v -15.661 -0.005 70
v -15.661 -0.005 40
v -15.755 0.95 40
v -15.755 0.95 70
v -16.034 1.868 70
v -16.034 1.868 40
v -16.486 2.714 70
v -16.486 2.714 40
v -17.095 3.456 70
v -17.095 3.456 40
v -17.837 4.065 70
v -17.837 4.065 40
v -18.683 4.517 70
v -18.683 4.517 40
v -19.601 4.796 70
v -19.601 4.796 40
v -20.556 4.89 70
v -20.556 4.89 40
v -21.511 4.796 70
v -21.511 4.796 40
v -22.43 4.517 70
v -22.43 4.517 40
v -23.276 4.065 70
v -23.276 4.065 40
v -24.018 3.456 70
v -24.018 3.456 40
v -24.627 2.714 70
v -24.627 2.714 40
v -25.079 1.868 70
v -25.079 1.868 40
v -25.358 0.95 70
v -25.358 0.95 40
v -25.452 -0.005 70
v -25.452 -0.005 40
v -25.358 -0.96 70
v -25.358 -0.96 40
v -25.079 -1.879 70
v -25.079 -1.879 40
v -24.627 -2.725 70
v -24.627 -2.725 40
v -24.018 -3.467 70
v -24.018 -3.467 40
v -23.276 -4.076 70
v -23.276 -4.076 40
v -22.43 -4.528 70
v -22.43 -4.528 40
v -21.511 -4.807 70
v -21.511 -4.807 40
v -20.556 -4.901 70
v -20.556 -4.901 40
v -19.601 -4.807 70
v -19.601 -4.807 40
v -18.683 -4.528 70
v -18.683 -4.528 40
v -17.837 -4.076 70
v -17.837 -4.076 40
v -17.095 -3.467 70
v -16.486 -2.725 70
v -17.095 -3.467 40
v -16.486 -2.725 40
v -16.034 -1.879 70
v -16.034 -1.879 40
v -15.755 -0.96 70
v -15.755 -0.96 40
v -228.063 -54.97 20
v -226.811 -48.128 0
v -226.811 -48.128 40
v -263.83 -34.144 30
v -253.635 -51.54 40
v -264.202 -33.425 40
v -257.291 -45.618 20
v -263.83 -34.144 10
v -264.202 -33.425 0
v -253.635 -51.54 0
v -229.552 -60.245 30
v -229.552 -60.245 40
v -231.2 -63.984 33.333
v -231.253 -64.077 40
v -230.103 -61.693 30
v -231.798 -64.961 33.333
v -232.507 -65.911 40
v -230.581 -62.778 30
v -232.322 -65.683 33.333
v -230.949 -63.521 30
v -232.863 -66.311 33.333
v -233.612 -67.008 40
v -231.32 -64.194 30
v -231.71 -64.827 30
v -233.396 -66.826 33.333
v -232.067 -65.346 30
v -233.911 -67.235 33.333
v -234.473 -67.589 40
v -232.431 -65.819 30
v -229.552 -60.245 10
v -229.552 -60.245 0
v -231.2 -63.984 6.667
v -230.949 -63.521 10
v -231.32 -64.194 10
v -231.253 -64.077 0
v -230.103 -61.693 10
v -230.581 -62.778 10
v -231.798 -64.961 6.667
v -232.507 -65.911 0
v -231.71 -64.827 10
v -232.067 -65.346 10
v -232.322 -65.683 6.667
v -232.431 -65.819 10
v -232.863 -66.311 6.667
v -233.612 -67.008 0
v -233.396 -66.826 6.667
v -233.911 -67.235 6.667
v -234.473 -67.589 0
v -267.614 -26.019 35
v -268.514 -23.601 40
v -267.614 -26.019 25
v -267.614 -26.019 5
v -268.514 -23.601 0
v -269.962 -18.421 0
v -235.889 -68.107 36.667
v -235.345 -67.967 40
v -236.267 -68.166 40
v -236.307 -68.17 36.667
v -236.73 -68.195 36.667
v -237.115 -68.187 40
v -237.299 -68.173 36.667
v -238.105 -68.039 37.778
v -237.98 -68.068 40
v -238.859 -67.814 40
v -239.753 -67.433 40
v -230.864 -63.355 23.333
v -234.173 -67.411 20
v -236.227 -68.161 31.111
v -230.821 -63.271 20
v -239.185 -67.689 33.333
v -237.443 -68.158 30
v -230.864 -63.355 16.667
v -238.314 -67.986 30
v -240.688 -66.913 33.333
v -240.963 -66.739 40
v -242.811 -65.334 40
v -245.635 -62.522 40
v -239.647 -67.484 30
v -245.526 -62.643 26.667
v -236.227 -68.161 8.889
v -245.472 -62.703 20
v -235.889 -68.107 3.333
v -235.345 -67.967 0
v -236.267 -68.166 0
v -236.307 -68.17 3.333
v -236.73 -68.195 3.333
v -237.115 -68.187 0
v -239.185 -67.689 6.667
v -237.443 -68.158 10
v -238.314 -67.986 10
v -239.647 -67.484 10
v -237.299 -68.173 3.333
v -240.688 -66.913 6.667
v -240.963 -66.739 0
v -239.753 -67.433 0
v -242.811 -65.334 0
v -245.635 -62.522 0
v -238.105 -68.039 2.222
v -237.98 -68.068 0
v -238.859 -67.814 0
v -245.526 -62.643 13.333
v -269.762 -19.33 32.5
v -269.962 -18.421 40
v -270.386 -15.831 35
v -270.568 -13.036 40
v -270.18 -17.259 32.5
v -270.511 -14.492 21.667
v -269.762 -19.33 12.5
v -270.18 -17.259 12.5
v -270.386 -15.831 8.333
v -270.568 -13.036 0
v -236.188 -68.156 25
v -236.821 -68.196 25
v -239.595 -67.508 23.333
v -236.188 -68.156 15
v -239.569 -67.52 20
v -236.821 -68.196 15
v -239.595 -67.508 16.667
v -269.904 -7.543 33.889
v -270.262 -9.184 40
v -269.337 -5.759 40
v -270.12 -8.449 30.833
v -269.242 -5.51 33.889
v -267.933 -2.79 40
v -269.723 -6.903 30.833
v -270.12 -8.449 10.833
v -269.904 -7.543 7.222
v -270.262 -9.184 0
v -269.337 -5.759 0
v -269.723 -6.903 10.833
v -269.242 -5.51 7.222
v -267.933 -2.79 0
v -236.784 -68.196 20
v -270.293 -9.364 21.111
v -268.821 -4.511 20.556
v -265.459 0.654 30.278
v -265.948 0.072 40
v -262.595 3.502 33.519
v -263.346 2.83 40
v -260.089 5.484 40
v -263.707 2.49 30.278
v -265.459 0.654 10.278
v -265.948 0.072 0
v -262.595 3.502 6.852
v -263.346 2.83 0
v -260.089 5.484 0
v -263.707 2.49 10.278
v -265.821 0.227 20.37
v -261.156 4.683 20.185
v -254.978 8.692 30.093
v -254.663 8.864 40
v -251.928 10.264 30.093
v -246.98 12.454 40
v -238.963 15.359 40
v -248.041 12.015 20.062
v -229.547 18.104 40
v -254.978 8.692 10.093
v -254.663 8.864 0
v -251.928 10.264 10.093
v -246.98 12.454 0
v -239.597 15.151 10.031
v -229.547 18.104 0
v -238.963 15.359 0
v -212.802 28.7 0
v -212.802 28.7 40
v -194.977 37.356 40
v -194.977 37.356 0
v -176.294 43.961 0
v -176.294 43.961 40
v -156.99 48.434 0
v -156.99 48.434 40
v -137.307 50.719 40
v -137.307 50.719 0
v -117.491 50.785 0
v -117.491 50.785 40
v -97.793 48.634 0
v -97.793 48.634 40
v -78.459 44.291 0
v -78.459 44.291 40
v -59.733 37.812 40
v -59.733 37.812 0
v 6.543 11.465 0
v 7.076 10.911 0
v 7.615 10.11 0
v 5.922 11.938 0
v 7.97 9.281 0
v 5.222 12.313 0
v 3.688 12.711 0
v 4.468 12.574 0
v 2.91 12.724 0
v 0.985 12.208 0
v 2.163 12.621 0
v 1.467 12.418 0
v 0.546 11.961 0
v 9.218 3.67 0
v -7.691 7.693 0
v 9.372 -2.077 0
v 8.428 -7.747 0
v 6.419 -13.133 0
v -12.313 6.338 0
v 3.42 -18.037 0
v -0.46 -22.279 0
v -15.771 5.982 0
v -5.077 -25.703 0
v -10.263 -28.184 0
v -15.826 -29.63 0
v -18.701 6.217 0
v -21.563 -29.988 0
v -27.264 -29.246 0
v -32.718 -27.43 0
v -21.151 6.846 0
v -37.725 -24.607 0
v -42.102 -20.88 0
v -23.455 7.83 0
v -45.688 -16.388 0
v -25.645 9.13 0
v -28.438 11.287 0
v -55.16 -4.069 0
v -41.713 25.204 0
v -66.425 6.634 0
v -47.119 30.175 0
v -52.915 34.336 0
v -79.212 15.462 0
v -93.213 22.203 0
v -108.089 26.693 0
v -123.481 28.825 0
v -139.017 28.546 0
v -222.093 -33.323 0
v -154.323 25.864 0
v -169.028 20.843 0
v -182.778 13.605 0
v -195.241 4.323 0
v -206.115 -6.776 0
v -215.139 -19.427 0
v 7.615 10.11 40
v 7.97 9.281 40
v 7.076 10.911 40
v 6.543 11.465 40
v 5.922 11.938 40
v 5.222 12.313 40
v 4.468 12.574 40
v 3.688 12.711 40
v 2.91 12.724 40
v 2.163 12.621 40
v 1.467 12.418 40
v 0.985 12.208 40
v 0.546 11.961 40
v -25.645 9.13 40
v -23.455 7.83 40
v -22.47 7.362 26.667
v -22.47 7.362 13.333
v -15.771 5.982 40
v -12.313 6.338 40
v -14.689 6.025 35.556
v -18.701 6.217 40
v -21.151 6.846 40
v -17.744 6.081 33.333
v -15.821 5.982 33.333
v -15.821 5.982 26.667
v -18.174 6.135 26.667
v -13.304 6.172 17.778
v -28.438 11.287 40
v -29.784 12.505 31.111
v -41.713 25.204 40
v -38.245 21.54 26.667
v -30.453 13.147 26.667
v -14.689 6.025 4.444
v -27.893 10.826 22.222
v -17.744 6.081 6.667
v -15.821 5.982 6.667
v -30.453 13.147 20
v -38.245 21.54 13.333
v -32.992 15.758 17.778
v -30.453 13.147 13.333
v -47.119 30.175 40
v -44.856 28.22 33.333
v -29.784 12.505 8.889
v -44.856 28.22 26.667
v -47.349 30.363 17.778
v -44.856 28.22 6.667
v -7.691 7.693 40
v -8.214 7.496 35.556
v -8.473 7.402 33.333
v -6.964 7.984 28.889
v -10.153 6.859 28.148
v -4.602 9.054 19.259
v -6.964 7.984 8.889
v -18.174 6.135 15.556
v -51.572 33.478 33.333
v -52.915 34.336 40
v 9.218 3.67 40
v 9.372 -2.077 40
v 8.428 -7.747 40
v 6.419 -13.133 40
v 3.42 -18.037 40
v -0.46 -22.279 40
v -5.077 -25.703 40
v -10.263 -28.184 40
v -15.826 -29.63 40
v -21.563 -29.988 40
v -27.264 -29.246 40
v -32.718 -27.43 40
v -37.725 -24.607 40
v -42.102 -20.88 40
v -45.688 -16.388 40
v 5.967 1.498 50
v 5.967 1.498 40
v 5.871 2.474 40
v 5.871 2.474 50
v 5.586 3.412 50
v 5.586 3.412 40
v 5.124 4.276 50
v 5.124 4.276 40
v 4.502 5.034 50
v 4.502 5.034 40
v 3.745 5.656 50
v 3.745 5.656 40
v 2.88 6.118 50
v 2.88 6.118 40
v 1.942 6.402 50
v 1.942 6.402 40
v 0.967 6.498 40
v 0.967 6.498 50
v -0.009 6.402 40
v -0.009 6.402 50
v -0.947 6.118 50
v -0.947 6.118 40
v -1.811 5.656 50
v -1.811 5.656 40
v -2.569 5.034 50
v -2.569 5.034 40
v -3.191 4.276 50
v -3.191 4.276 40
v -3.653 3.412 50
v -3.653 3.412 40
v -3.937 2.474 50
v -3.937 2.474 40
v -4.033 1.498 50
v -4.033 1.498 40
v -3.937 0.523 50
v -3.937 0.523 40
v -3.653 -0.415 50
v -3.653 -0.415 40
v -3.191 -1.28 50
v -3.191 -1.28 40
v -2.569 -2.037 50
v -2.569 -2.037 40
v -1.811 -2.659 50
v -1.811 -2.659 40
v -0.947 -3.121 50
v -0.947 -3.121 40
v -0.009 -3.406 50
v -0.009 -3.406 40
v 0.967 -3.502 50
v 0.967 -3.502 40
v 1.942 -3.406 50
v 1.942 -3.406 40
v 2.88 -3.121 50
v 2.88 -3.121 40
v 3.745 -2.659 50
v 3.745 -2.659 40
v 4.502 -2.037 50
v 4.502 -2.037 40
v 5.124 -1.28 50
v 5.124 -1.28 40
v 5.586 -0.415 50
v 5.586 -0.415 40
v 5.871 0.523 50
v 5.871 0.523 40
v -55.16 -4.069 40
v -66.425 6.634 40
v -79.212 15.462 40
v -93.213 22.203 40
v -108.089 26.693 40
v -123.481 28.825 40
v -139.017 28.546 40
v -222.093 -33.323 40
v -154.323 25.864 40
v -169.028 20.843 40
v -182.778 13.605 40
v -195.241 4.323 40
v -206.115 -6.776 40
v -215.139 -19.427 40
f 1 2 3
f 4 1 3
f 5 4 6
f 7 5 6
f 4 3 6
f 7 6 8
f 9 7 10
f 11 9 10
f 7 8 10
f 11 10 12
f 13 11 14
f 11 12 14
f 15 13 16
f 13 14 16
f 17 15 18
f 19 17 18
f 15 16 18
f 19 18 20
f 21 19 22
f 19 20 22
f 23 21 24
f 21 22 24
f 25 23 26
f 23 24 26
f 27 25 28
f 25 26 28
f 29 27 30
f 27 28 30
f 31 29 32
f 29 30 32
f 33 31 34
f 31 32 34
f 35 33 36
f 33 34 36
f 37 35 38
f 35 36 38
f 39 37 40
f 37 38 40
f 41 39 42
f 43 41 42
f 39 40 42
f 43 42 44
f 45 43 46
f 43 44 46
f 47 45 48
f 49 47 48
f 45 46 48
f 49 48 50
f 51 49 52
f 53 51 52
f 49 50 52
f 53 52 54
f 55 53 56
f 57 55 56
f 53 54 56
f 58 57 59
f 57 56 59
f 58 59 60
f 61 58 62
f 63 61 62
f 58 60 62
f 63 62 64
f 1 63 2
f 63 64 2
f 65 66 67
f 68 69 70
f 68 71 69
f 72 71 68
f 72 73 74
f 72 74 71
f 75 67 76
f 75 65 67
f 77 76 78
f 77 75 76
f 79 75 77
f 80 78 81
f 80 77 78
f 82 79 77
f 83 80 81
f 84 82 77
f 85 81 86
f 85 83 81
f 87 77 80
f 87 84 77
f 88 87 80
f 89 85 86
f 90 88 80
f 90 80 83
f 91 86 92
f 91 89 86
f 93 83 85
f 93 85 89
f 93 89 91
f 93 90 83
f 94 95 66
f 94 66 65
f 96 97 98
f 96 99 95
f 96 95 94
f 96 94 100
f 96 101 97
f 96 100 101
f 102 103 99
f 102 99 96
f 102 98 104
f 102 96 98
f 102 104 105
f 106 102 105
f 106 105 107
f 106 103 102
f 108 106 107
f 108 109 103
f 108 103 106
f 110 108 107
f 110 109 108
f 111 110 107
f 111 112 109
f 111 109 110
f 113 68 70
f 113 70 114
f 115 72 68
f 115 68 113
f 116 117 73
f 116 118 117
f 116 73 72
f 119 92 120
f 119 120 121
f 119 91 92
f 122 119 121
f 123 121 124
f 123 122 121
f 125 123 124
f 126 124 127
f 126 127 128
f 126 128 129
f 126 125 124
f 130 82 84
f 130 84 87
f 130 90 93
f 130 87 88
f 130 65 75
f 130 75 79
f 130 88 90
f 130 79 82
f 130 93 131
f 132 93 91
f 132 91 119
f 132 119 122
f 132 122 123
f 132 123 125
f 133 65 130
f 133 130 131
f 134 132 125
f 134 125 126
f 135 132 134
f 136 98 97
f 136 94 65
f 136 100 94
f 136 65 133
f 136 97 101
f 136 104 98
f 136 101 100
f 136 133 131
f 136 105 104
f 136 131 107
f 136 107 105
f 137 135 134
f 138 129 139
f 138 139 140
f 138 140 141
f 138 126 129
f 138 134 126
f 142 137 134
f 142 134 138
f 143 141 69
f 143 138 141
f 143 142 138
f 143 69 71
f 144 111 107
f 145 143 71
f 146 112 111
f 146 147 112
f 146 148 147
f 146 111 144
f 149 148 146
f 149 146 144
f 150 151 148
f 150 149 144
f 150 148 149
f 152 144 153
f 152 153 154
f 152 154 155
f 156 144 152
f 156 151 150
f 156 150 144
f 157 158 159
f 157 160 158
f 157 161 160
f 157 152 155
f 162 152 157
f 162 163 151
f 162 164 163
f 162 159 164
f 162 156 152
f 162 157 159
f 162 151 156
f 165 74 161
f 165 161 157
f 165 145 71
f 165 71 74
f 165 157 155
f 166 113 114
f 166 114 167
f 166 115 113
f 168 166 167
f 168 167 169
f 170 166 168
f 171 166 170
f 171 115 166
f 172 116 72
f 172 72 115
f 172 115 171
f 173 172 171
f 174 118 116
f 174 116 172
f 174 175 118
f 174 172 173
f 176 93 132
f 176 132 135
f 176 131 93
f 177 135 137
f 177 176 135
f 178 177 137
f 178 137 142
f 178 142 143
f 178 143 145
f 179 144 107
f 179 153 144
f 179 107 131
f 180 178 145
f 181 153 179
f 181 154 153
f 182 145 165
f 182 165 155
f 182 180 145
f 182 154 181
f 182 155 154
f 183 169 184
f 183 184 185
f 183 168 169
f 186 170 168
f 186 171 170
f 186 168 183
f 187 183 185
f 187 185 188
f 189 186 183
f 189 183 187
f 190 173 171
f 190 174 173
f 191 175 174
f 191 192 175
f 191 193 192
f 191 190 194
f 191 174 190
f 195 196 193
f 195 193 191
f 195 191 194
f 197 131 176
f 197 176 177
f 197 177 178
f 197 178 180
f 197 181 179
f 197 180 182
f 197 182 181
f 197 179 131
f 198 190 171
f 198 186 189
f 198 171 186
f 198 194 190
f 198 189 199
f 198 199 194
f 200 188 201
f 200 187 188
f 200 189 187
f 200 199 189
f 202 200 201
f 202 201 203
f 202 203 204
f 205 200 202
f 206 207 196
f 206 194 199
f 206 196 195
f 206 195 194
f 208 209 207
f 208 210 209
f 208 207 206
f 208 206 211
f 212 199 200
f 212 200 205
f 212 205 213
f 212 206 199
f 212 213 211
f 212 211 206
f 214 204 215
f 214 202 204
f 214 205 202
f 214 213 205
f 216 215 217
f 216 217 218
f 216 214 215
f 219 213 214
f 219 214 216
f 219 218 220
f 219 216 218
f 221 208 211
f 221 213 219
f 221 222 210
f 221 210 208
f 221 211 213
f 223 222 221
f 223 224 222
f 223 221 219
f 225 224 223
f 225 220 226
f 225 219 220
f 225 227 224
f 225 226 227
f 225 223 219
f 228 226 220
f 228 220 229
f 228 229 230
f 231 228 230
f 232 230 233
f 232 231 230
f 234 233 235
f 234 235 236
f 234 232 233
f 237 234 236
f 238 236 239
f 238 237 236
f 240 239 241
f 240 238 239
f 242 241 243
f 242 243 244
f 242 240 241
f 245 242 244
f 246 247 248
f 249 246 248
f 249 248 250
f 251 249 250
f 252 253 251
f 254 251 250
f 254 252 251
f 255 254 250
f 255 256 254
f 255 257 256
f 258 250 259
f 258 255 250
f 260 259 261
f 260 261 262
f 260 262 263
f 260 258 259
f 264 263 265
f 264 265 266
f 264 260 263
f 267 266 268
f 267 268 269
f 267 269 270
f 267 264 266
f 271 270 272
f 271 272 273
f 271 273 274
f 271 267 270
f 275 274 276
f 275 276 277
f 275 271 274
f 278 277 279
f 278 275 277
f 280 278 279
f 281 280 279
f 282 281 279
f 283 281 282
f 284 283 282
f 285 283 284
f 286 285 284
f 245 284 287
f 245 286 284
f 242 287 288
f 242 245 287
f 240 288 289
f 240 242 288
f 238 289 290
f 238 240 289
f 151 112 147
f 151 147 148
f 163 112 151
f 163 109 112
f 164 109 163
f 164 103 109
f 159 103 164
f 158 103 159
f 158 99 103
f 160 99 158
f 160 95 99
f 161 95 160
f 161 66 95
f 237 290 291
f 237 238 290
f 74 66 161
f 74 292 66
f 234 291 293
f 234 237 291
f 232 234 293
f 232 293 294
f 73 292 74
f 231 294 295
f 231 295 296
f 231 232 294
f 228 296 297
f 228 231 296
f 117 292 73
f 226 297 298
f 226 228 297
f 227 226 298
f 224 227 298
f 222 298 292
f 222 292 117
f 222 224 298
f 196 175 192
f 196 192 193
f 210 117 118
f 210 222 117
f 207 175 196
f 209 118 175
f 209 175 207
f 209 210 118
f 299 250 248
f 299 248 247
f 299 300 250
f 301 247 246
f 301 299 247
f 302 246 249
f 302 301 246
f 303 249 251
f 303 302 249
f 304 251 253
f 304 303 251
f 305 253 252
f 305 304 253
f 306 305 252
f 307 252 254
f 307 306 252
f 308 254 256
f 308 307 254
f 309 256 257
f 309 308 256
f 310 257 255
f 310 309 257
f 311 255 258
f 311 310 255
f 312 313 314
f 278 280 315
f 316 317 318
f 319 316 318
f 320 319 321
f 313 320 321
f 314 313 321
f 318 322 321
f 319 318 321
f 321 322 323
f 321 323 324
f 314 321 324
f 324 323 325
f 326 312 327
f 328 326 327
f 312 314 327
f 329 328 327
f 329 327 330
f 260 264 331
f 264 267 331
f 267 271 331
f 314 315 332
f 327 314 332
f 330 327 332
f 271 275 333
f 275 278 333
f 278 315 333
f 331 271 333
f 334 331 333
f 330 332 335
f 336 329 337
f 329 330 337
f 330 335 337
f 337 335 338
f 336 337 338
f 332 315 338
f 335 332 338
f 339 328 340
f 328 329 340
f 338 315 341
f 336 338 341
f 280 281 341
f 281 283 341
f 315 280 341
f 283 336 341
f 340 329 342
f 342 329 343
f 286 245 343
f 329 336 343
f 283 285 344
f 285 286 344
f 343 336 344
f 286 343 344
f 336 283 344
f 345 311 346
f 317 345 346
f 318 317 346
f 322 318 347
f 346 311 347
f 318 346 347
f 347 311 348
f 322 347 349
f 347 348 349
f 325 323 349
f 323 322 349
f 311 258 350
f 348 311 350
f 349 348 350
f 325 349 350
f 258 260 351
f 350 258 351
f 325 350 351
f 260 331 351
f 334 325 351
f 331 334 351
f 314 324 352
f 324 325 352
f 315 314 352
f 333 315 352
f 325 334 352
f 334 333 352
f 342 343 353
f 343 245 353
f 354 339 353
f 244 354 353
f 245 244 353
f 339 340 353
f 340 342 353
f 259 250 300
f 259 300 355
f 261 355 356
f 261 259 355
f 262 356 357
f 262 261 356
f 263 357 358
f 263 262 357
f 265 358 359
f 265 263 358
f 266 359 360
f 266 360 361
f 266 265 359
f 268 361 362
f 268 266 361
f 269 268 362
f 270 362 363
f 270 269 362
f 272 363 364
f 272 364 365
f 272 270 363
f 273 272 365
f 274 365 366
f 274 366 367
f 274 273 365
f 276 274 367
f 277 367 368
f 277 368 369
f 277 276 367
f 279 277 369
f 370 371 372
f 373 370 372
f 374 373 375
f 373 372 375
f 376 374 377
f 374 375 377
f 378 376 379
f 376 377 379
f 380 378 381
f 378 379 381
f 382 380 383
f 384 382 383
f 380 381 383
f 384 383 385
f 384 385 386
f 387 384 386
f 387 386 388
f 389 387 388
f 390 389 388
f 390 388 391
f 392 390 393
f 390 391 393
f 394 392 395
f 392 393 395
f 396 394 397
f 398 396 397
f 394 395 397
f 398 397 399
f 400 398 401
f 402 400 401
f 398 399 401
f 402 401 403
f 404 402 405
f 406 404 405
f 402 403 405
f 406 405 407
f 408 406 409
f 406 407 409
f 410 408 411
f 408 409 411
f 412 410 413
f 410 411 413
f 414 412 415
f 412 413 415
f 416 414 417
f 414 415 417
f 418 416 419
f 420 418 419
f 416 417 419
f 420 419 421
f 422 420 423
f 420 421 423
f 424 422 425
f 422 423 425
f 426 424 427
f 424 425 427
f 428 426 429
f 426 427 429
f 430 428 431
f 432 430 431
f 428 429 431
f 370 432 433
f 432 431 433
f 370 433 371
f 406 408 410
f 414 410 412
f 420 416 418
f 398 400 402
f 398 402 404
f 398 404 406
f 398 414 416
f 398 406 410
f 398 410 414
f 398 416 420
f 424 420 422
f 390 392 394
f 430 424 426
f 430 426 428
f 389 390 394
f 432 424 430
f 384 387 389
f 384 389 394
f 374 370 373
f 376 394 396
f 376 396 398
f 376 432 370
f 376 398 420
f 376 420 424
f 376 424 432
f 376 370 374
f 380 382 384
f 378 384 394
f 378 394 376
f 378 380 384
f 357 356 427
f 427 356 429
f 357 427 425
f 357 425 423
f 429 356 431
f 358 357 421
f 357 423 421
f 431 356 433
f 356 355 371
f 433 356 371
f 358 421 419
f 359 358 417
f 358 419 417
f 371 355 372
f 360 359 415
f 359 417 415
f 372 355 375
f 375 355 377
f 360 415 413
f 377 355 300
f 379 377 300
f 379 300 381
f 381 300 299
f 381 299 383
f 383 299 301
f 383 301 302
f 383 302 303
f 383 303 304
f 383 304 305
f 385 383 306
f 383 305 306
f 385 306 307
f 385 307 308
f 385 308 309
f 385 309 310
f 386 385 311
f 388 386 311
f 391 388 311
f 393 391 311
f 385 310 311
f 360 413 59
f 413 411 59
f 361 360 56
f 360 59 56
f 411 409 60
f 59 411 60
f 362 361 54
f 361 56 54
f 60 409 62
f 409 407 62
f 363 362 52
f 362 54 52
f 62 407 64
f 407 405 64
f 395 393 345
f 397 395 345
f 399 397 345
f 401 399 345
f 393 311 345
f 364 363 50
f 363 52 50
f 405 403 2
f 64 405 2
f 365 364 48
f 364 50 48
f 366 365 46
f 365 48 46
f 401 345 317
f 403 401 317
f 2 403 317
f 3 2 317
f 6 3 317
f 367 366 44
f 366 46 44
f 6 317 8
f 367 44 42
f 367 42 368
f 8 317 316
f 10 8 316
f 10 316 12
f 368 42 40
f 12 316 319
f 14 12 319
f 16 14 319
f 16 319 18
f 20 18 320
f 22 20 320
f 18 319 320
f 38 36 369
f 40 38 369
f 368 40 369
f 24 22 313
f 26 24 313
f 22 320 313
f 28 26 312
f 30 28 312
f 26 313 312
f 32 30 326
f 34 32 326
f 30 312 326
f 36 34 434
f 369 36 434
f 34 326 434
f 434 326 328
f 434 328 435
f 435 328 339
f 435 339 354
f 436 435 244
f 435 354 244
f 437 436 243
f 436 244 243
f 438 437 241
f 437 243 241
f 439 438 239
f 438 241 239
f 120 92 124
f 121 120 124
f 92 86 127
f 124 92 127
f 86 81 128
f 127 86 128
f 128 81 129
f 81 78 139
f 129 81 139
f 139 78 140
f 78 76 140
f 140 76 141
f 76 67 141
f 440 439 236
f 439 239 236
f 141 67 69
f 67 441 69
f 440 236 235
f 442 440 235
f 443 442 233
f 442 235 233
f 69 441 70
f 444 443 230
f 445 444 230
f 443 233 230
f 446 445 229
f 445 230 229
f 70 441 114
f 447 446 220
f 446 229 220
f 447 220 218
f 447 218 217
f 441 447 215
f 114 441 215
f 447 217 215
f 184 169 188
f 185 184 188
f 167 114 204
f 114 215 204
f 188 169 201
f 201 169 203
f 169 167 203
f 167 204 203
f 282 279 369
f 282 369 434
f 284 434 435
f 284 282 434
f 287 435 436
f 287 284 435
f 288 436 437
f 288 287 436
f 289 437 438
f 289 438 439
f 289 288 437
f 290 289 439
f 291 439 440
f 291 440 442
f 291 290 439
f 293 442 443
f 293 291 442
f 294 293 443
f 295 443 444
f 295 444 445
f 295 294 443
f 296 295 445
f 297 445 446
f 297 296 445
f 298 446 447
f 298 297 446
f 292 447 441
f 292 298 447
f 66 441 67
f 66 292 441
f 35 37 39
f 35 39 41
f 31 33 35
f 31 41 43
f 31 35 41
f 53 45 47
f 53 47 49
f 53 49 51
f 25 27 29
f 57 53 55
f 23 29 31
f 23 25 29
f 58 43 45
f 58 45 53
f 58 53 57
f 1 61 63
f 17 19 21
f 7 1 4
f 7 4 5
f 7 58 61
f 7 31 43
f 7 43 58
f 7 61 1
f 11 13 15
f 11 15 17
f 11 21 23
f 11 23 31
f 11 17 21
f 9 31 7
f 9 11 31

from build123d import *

# Parameters (mm, degrees)
EXTRUDE_1_DEPTH = 40
FILLET_1_R      = 5
SKETCH_2_R      = 5
EXTRUDE_2_DEPTH = 10
SKETCH_3_R      = 4.895354235
EXTRUDE_3_DEPTH = 30


with BuildPart() as part:
    # 草图1 → 凸台-拉伸1 (new body)
    with BuildSketch(Plane.XY):
        with BuildLine():
            ThreePointArc((5.298924233, 15.21006088), (-4.753279677, -25.505505888), (-45.688242176, -16.387774488))
            ThreePointArc((-45.688242176, -16.387774488), (-146.722291952, 27.502807651), (-226.811353191, -48.127904925))
            add(Edge.make_bspline(
                [(-226.811353191, -48.127904925), (-232.171148588, -84.685316591), (-269.798080997, -29.139192175), (-283.009548959, 4.044745309), (-229.546733983, 18.104203538)],
                knots=[0, 0, 0, 0, 0.380868914, 1, 1, 1, 1], degree=3))
            ThreePointArc((-229.546733983, 18.104203538), (-147.18059155, 49.852575787), (-59.732589489, 37.811500446))
            add(Edge.make_bspline(
                [(5.298924233, 15.21006088), (-30.412417087, -10.923043058), (-29.671088016, 25.482582404), (-59.732589489, 37.811500446)],
                knots=[0, 0, 0, 0, 1, 1, 1, 1], degree=3))
        make_face()
    extrude(amount=EXTRUDE_1_DEPTH)

    # 圆角1
    fillet_1_edges = [part.edges().sort_by_distance(p)[0] for p in [
        (5.298924233, 15.21006088, 20),
    ]]
    fillet(fillet_1_edges, radius=FILLET_1_R)

    # 草图2 → 凸台-拉伸2 (add)
    with BuildSketch(Plane(origin=(3.130153076, 1.250725173, 40), x_dir=(1, 0, 0), z_dir=(0, 0, 1))):
        with Locations((-2.163474259, 0.247591508)):
            Circle(SKETCH_2_R)
    extrude(amount=EXTRUDE_2_DEPTH)

    # 草图3 → 凸台-拉伸3 (add)
    with BuildSketch(Plane.XY.offset(40)):
        with Locations((-20.556336683, -0.005243355)):
            Circle(SKETCH_3_R)
    extrude(amount=EXTRUDE_3_DEPTH)


solid = part.part
